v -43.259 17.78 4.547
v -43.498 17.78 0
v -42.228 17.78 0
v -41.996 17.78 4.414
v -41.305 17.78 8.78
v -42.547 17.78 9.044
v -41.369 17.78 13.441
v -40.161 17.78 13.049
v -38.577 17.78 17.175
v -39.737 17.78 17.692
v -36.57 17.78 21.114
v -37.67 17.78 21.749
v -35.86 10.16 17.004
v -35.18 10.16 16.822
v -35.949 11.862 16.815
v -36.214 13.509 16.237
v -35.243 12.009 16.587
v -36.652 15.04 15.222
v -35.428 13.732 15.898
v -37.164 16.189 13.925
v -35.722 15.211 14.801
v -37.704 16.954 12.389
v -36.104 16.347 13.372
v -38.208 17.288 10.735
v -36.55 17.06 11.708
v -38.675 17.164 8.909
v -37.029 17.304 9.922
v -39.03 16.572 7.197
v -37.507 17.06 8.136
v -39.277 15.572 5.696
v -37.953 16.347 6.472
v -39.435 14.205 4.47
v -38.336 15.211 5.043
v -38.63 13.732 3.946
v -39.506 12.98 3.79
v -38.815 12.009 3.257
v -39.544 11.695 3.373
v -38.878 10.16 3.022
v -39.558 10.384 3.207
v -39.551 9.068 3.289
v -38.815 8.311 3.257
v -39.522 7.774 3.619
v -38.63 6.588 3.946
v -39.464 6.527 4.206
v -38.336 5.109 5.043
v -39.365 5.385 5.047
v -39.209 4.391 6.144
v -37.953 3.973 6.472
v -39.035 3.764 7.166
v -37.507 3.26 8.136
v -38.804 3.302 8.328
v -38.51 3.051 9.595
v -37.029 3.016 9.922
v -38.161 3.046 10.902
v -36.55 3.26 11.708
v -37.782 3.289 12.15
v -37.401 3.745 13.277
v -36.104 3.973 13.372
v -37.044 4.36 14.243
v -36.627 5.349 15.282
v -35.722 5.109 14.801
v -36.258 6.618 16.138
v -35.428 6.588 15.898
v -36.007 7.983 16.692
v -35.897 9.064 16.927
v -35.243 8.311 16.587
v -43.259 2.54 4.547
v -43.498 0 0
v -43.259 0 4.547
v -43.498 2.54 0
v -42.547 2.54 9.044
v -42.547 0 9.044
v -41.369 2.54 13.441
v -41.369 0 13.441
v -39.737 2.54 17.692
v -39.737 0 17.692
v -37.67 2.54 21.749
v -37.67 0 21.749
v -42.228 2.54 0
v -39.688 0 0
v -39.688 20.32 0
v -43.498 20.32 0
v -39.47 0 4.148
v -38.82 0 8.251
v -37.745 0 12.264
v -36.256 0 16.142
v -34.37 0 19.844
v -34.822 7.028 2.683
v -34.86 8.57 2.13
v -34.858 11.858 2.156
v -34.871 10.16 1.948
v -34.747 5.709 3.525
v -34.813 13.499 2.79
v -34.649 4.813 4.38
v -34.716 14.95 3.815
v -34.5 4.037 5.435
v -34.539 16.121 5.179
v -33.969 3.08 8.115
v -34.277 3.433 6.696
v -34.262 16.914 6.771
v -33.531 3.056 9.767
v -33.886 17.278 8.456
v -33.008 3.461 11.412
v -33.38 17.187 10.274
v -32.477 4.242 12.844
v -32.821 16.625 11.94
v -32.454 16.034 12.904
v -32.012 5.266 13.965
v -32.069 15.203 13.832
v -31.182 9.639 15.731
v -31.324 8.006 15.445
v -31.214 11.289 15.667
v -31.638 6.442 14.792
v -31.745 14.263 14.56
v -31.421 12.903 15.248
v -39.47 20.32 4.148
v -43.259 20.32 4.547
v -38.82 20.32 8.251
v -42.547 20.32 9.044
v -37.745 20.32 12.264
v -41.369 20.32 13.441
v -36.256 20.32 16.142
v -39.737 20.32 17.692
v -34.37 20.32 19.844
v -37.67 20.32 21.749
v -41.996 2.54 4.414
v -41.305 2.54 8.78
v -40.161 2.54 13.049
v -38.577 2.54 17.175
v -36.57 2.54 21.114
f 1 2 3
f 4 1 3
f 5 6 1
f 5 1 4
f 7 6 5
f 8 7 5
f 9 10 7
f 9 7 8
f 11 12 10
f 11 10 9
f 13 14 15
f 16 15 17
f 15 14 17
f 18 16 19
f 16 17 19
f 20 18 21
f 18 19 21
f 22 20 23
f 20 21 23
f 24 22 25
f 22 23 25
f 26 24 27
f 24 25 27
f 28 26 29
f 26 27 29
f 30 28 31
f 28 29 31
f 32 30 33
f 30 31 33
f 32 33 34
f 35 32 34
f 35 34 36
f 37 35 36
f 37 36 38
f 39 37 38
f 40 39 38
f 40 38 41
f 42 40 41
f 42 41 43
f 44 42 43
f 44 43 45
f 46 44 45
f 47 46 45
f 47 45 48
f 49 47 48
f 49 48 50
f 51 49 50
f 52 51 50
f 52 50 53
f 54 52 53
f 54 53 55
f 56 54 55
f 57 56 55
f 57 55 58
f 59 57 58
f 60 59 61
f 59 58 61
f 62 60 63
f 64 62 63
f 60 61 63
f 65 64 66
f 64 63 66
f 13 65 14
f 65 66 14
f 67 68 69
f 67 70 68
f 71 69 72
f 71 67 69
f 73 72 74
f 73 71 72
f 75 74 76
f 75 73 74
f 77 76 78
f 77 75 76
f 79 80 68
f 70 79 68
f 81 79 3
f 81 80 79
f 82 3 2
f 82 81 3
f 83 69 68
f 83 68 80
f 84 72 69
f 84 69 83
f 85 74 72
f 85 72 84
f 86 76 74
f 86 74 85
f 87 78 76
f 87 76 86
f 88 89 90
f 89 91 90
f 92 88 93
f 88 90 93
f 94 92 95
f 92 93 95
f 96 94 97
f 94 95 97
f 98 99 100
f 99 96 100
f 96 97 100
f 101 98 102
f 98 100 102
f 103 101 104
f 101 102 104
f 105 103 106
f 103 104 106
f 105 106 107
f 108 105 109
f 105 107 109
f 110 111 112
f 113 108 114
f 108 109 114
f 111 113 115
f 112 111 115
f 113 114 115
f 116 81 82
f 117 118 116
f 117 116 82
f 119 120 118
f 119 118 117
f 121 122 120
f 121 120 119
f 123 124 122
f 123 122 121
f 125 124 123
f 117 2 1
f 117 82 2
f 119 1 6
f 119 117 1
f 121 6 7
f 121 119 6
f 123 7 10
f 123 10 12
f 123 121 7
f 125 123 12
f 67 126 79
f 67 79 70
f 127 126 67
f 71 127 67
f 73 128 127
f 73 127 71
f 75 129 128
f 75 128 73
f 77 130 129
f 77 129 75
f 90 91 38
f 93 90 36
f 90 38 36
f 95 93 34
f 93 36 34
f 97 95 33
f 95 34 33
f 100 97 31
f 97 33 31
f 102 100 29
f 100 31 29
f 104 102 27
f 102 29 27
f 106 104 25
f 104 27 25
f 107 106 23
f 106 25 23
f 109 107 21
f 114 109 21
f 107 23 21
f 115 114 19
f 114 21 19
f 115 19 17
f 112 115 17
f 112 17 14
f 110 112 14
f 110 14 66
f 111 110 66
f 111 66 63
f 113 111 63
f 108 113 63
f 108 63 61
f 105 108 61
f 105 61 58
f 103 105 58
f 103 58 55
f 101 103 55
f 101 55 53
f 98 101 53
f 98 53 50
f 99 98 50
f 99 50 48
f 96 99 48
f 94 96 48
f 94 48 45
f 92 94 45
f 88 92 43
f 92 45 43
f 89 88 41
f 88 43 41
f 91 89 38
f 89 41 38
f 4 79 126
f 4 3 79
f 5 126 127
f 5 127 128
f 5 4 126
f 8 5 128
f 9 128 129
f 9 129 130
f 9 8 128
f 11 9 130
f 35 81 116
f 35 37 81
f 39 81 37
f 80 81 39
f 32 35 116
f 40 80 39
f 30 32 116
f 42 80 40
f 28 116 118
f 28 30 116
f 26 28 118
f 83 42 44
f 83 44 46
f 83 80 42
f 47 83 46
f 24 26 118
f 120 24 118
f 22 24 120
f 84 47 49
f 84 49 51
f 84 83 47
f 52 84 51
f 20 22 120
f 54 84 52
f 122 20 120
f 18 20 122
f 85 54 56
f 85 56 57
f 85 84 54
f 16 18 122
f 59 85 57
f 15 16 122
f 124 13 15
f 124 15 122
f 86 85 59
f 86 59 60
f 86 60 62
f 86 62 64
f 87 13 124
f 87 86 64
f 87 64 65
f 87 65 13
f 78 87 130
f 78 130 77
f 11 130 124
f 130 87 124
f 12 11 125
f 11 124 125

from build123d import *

# Parameters (mm, degrees)
REVOLVE1_ANGLE      = 30
SKETCH2_R           = 7.14375
BOSS_EXTRUDE1_DEPTH = 2.54
SKETCH3_R           = 7.14375
BOSS_EXTRUDE2_DEPTH = 6.35
SKETCH4_W           = 34.925
SKETCH4_H           = 20.32
CUT_REVOLVE1_ANGLE  = 30


with BuildPart() as part:
    # Sketch1 → Revolve1 (revolve)
    with BuildSketch(Plane.XY):
        Polygon((-43.4975, 0), (-43.4975, 2.54), (-42.2275, 2.54), (-42.2275, 17.78), (-43.4975, 17.78), (-43.4975, 20.32), (-39.6875, 20.32), (-39.6875, 0), align=None)
    revolve(axis=Axis((0, 0, 0), (0, 1, 0)), revolution_arc=REVOLVE1_ANGLE)

    # Sketch2 → Boss-Extrude1 (add)
    with BuildSketch(Plane(origin=(-37.028941606, 0, 9.921875), x_dir=(0.258819045, 0, 0.965925826), z_dir=(-0.965925826, 0, 0.258819045))):
        with Locations((0, 10.16)):
            Circle(SKETCH2_R)
    extrude(amount=BOSS_EXTRUDE1_DEPTH)

    # Sketch3 → Boss-Extrude2 (add)
    with BuildSketch(Plane(origin=(-37.028941606, 0, 9.921875), x_dir=(-0.258819045, 0, -0.965925826), z_dir=(0.965925826, 0, -0.258819045))):
        with Locations((0, 10.16)):
            Circle(SKETCH3_R)
    extrude(amount=BOSS_EXTRUDE2_DEPTH)

    # Sketch4 → Cut-Revolve1 (revolve, cut)
    with BuildSketch(Plane.XY):
        with Locations((-17.4625, 10.16)):
            Rectangle(SKETCH4_W, SKETCH4_H)
    revolve(axis=Axis((0, 0, 0), (0, 1, 0)), revolution_arc=CUT_REVOLVE1_ANGLE, mode=Mode.SUBTRACT)


solid = part.part
